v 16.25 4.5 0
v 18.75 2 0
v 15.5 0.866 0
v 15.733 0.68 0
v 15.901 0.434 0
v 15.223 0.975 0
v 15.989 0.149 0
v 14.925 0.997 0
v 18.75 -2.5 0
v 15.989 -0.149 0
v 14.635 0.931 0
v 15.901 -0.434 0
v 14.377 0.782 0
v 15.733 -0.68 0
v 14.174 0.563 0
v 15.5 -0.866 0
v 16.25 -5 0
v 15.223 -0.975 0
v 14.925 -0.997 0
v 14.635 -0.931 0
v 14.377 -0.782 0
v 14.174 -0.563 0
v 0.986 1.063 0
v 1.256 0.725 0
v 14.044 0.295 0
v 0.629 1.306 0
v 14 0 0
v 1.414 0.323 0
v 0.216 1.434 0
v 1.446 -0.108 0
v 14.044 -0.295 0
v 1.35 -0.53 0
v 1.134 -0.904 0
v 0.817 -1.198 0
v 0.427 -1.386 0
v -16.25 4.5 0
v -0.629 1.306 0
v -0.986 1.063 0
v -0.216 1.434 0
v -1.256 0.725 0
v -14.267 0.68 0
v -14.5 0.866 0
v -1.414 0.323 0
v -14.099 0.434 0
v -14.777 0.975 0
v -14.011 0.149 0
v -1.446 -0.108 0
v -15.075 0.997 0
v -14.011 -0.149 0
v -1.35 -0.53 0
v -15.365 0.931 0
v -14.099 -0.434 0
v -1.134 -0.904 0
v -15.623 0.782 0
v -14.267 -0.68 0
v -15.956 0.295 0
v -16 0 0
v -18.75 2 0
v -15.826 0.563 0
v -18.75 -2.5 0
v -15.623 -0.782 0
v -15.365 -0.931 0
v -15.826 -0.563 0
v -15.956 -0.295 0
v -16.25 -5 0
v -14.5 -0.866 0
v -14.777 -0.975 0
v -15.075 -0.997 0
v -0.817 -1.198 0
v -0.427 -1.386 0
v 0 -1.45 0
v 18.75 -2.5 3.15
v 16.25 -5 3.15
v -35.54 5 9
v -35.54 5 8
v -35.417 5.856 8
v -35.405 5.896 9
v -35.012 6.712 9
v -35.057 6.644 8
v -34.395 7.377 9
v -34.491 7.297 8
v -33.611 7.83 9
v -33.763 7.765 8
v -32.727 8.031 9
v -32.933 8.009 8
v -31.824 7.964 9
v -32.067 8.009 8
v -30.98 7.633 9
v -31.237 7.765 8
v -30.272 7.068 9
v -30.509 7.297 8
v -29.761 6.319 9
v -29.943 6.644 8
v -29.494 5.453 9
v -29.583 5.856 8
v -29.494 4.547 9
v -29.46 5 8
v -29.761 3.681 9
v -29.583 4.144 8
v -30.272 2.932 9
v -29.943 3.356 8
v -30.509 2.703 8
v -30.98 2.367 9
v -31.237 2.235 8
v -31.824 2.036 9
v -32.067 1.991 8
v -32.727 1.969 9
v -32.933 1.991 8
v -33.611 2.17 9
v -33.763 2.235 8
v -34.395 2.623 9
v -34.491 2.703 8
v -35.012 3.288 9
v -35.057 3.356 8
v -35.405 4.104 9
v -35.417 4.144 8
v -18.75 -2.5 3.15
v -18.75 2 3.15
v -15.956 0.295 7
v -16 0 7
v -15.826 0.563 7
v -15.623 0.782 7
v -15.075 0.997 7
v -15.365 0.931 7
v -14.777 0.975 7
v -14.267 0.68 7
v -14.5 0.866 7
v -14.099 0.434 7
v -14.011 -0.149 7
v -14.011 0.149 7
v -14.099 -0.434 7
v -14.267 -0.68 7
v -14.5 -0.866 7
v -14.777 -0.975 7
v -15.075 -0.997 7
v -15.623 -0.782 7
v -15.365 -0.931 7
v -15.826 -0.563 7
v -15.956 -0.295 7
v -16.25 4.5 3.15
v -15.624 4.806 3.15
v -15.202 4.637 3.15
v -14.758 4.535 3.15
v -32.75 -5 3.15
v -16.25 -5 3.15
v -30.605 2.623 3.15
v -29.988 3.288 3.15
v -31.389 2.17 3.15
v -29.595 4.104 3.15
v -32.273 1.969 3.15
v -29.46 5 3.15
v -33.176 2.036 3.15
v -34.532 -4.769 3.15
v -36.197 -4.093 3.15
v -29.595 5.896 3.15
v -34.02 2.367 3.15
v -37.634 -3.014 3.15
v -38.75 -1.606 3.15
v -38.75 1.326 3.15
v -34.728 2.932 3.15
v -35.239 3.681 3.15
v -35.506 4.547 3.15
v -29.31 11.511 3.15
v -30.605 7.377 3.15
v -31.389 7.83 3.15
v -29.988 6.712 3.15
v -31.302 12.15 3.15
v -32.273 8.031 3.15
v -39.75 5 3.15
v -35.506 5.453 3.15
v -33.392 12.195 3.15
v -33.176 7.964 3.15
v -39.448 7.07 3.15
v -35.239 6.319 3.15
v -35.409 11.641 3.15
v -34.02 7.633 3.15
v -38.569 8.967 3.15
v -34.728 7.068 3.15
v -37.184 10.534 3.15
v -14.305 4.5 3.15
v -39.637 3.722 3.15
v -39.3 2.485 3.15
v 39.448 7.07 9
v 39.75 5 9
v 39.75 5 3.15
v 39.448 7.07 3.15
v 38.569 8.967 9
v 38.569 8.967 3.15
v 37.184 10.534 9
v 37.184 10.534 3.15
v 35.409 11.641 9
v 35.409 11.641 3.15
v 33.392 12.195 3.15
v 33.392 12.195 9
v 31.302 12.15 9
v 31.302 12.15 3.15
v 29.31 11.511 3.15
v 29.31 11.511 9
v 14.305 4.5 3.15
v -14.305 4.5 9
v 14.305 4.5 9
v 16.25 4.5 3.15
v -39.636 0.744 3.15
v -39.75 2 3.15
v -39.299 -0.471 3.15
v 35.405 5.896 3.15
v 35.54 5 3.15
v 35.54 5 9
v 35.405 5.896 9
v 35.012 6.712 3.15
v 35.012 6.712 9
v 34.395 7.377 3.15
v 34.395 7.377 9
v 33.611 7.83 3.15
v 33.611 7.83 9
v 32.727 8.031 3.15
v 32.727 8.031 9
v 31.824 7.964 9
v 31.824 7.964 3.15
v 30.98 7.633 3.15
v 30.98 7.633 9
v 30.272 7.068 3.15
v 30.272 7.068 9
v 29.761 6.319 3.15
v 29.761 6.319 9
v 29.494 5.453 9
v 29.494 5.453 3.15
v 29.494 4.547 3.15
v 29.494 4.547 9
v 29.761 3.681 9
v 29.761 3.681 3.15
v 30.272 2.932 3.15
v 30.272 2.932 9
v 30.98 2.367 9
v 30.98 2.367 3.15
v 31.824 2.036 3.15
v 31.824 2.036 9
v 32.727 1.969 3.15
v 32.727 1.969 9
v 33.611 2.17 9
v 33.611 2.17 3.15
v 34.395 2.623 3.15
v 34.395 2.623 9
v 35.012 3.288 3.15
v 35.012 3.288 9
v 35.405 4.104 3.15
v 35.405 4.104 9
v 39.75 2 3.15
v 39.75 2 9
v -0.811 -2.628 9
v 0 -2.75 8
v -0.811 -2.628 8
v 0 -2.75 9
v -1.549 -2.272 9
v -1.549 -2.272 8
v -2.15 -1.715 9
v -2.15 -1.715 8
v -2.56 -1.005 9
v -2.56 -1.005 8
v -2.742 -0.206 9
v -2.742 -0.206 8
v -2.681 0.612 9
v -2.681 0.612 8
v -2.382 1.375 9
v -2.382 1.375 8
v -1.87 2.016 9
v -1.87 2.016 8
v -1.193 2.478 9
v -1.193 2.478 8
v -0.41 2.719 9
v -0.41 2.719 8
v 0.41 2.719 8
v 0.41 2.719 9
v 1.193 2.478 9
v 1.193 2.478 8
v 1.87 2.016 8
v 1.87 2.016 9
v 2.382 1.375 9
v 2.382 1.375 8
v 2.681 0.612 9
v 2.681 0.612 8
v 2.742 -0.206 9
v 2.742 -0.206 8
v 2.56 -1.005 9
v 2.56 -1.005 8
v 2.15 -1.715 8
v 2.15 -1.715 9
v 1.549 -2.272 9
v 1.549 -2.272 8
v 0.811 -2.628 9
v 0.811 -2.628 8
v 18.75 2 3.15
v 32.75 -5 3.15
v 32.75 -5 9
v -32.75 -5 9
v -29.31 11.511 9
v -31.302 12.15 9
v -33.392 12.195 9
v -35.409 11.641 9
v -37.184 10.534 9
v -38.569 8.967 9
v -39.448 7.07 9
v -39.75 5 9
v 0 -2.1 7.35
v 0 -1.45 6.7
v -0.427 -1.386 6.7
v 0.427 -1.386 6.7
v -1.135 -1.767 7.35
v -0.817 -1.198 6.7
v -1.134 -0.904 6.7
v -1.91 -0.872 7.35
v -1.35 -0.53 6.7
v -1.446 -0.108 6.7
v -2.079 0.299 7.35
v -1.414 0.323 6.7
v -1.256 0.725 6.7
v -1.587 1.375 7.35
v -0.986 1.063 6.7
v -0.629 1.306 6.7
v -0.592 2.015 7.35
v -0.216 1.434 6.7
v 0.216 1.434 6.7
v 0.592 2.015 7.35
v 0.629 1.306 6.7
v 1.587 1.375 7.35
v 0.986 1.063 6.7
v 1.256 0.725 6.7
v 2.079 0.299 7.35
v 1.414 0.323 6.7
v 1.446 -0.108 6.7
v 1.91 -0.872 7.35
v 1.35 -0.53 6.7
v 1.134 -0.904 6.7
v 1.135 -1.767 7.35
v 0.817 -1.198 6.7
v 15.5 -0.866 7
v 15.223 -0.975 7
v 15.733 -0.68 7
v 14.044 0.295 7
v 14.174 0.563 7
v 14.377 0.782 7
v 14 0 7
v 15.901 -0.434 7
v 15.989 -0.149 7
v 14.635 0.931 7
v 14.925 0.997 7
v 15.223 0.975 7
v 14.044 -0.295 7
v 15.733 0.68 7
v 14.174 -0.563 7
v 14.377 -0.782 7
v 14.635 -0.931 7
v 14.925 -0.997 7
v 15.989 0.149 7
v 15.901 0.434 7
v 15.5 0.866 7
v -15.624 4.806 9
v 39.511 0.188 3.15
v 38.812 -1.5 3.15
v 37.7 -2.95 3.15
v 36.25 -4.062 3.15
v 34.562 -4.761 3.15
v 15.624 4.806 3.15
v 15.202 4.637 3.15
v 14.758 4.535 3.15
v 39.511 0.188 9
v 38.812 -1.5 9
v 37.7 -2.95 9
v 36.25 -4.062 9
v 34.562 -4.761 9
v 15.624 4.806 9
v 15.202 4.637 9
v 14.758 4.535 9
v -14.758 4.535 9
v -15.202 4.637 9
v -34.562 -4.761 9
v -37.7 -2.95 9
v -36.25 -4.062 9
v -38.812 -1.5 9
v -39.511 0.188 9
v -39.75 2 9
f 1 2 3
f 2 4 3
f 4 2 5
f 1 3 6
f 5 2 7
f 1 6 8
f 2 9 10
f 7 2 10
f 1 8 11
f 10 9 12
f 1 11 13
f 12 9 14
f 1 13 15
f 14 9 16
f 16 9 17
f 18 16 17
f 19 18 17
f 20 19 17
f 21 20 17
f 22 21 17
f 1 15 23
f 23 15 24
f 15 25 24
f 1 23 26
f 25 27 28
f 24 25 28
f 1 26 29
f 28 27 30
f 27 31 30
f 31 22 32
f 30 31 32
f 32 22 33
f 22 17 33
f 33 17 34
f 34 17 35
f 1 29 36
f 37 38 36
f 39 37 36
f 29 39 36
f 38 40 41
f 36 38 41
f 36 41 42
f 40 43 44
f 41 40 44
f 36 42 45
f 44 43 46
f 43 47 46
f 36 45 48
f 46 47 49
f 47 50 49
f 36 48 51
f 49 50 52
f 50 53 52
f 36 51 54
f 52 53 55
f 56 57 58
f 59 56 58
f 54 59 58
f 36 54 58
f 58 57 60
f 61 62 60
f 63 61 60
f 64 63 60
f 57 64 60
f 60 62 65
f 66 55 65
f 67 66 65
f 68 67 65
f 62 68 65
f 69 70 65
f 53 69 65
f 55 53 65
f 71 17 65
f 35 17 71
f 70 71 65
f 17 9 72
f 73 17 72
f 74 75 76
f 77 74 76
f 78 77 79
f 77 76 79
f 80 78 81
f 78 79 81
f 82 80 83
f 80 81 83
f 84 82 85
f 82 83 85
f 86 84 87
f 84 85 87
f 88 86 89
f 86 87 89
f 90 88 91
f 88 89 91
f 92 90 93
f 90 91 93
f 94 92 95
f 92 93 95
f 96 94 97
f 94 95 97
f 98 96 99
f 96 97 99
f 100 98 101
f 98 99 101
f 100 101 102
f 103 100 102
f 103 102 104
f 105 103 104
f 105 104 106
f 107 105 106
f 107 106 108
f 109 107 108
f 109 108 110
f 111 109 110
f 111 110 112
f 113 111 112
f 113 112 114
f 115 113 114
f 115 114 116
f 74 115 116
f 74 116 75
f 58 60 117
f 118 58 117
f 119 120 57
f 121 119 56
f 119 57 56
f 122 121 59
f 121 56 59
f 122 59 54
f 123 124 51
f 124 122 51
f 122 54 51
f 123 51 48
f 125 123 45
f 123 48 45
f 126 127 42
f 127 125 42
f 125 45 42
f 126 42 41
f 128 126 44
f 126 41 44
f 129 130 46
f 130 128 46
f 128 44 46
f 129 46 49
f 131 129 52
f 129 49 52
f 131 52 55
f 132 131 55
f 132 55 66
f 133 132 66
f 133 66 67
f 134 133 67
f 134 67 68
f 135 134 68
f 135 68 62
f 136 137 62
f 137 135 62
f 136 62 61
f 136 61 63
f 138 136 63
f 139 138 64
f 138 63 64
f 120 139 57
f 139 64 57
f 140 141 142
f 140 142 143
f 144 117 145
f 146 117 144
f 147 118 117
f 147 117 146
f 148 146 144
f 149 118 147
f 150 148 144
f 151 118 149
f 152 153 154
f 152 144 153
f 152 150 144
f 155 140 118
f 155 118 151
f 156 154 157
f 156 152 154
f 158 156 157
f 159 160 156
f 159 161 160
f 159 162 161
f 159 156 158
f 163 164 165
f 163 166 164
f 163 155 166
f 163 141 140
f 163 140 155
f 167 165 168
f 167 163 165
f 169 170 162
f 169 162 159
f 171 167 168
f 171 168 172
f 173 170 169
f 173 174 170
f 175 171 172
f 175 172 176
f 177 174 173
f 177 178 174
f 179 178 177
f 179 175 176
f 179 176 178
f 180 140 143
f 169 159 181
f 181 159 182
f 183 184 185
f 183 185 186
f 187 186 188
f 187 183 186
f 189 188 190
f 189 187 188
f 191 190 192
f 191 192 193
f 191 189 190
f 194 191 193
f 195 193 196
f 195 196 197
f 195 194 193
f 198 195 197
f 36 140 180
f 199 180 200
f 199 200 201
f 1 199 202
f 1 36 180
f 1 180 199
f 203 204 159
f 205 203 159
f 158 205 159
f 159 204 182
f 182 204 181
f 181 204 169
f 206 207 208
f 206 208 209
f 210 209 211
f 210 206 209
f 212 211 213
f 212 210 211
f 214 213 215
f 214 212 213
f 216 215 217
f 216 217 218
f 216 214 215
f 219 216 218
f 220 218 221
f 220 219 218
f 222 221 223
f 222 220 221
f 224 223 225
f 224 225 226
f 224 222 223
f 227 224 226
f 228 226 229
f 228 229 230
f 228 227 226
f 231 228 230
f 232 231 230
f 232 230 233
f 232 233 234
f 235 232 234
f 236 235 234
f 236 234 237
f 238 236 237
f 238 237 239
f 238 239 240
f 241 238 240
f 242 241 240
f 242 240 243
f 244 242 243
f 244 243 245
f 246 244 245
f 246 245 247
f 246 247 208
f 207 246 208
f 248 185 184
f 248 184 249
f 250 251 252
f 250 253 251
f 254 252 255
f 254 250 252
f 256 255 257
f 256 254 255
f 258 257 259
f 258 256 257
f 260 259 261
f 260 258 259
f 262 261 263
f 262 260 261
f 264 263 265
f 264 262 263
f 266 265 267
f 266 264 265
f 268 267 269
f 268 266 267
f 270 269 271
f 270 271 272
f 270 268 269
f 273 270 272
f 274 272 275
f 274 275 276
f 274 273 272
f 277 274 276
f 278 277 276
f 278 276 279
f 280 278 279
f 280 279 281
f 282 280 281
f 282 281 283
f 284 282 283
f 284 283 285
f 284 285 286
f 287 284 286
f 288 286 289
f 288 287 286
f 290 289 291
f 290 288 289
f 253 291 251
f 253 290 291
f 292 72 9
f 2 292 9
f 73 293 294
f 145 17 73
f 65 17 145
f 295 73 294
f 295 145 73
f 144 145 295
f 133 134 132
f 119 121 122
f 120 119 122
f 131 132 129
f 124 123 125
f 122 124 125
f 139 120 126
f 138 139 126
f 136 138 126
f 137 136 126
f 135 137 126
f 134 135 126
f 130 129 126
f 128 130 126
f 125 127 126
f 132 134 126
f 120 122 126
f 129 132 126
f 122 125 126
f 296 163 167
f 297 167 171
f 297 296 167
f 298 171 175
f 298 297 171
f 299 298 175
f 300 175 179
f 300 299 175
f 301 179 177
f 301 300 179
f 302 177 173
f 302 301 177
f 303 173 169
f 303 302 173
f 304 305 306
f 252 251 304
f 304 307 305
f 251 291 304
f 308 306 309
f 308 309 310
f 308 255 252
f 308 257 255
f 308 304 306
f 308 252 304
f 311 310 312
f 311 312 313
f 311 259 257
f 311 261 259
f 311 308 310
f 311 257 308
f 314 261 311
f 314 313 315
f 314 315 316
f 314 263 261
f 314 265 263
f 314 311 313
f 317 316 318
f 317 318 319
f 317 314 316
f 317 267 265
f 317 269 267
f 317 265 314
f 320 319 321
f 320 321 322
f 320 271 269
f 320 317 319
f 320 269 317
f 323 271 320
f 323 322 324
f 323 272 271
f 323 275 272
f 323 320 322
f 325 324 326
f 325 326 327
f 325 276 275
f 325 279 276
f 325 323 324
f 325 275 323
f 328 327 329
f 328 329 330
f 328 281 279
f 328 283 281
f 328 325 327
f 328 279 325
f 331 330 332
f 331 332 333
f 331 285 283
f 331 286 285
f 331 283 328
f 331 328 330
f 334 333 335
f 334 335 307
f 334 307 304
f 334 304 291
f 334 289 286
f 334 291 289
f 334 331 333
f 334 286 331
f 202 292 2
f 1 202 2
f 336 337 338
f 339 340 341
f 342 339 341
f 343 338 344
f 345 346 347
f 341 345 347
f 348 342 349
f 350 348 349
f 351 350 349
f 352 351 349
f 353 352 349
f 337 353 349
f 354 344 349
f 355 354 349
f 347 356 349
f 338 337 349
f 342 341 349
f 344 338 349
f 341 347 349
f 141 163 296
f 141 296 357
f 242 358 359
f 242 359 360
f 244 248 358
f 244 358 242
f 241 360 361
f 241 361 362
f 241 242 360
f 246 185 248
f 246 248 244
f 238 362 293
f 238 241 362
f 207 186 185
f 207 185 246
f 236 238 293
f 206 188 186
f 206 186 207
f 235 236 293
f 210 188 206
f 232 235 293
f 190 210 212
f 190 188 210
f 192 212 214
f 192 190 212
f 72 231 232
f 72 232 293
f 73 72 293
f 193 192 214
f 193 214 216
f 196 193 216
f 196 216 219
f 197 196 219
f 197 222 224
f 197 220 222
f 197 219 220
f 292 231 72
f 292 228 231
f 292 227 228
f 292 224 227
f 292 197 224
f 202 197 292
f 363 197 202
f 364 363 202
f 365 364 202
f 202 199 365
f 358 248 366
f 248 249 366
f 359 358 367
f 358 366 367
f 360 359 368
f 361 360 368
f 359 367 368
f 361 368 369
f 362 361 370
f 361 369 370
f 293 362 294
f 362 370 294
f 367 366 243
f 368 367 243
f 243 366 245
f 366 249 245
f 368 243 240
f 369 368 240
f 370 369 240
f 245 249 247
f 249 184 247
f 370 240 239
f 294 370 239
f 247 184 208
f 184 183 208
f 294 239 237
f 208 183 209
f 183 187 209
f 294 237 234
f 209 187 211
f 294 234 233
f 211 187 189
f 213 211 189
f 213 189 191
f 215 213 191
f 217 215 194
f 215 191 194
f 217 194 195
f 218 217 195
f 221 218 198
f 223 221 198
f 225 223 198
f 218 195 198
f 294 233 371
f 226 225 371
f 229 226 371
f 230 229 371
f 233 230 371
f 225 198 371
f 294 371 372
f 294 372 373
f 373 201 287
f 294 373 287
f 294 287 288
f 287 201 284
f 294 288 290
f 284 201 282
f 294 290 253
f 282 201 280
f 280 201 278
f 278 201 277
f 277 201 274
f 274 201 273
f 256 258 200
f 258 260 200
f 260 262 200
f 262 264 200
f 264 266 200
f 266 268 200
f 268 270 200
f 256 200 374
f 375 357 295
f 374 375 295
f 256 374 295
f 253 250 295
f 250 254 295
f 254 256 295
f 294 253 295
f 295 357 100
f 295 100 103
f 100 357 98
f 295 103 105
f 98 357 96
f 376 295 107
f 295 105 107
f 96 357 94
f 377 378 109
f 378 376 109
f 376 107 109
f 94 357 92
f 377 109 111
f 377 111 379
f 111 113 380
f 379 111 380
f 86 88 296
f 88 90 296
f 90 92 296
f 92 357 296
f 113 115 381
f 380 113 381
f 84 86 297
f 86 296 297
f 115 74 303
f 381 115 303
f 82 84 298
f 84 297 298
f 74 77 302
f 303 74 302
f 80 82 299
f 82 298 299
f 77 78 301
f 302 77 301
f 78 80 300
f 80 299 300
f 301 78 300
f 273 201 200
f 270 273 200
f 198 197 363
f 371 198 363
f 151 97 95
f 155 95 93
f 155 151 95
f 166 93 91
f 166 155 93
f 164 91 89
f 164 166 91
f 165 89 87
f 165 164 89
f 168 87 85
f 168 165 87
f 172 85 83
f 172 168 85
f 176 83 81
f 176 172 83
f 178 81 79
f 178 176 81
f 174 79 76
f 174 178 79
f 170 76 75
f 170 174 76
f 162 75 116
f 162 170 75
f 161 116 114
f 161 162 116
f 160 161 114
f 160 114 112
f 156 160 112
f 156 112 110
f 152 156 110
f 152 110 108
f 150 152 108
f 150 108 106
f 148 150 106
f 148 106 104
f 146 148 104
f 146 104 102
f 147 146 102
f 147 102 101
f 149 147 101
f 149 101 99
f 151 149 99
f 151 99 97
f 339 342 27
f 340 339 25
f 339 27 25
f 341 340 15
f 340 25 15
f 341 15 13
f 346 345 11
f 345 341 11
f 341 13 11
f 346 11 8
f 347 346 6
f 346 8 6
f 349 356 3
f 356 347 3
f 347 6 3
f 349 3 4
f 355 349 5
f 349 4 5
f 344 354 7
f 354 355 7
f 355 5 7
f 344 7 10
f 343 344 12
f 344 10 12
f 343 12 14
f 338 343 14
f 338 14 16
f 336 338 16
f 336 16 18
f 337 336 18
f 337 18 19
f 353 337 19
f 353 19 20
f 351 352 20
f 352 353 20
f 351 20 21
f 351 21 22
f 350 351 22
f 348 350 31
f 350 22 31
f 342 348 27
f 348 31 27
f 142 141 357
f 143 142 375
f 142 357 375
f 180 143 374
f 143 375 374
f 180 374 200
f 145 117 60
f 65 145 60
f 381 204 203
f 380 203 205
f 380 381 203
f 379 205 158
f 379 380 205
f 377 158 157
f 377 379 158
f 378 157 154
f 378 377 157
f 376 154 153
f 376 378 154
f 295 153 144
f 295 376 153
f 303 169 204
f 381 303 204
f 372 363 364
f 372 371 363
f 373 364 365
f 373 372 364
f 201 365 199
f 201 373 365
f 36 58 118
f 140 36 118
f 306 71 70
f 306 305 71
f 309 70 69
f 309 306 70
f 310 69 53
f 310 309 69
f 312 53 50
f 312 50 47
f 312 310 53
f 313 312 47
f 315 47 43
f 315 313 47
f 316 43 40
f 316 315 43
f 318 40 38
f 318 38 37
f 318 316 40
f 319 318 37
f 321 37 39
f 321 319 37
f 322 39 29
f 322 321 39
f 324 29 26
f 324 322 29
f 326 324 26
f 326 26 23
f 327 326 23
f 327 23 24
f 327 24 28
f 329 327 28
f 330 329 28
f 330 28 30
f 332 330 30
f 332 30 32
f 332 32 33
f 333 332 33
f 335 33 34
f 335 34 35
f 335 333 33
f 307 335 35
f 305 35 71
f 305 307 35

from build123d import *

# Parameters (mm, degrees)
SKETCH1_W                    = 77.5
SKETCH1_H                    = 7
BOSS_EXTRUDE1_DEPTH          = 9
BOSS_EXTRUDE1_DEPTH_BACK     = 9
SKETCH2_W                    = 20
SKETCH2_H                    = 6.3
CUT_EXTRUDE1_DEPTH           = 8
SKETCH3_W                    = 12.5
SKETCH3_H                    = 5.85
BOSS_EXTRUDE2_DEPTH          = 8
SKETCH4_R                    = 3.04
CUT_EXTRUDE2_DEPTH           = 22
CUT_EXTRUDE2_DEPTH_BACK      = 24.5
CUT_EXTRUDE3_DEPTH           = 5
SKETCH6_R                    = 6.2
CUT_EXTRUDE4_DEPTH           = 1
MIRROR2_COPY_1_SKETCH_R      = 6.2
MIRROR2_COPY_1_DEPTH         = 1
SKETCH7_W                    = 12.5
SKETCH7_H                    = 8.5
CUT_EXTRUDE5_DEPTH           = 1
MIRROR5_COPY_1_SKETCH_W      = 12.5
MIRROR5_COPY_1_SKETCH_H      = 8.5
MIRROR5_COPY_1_DEPTH         = 1
TAP_DRILL_FOR_M2_TAP1_D      = 1.6
CUT_EXTRUDE6_DEPTH           = 27
SKETCH12_W                   = 83.830839912
SKETCH12_H                   = 36.587504352
CUT_EXTRUDE7_DEPTH           = 22
F_2_0_2_DIAMETER_HOLE1_D     = 2
F_2_0_2_DIAMETER_HOLE1_DEPTH = 30.5
F_2_0_2_DIAMETER_HOLE2_D     = 2
F_2_0_2_DIAMETER_HOLE2_DEPTH = 16
F_2_0_2_DIAMETER_HOLE2_TIP   = 0.600860619
ESQUISSE2_R                  = 3.04
BOSS_EXTRU_1_DEPTH           = 1
ESQUISSE5_R                  = 0.8
BOSS_EXTRU_3_DEPTH           = 5.85
ESQUISSE6_R                  = 0.8
BOSS_EXTRU_4_DEPTH           = 9
BOSS_EXTRUDE3_DEPTH          = 1.5
BOSS_EXTRUDE4_DEPTH          = 1
SKETCH28_R                   = 7.25
SKETCH28_R_2                 = 6.25
BOSS_EXTRUDE7_DEPTH          = 5.85
BOSS_EXTRUDE5_DEPTH          = 5.85
FILLET2_R                    = 3
CHAMFER1_SIZE                = 2.5
SKETCH27_R                   = 1
BOSS_EXTRUDE6_DEPTH          = 2
BOSS_EXTRUDE8_DEPTH          = 5.85
FILLET3_R                    = 7


with BuildPart() as part:
    # Sketch1 → Boss-Extrude1 (new body, two sides)
    with BuildSketch(Plane.XY) as boss_extrude1_sk:
        Rectangle(SKETCH1_W, SKETCH1_H)
    extrude(amount=BOSS_EXTRUDE1_DEPTH)
    extrude(boss_extrude1_sk.sketch, amount=-BOSS_EXTRUDE1_DEPTH_BACK)

    # Sketch2 → Cut-Extrude1 (cut, through all)
    with BuildSketch(Plane(origin=(0, 3.5, 0), x_dir=(1, 0, 0), z_dir=(0, 1, 0))):
        with Locations((-28.75, 0)):
            Rectangle(SKETCH2_W, SKETCH2_H)
        with Locations((28.75, 0)):
            Rectangle(SKETCH2_W, SKETCH2_H)
    extrude(amount=-CUT_EXTRUDE1_DEPTH, mode=Mode.SUBTRACT)

    # Sketch3 → Boss-Extrude2 (add)
    with BuildSketch(Plane(origin=(0, 3.5, 0), x_dir=(1, 0, 0), z_dir=(0, 1, 0))):
        with Locations((-32.5, 6.075)):
            Rectangle(SKETCH3_W, SKETCH3_H)
        with Locations((-32.5, -6.075)):
            Rectangle(SKETCH3_W, SKETCH3_H)
        with Locations((32.5, -6.075)):
            Rectangle(SKETCH3_W, SKETCH3_H)
        with Locations((32.5, 6.075)):
            Rectangle(SKETCH3_W, SKETCH3_H)
    extrude(amount=BOSS_EXTRUDE2_DEPTH)

    # Sketch4 → Cut-Extrude2 (cut, two sides)
    with BuildSketch(Plane.XY) as cut_extrude2_sk:
        with Locations((-32.5, 5)):
            Circle(SKETCH4_R)
        with Locations((32.5, 5)):
            Circle(SKETCH4_R)
    extrude(amount=CUT_EXTRUDE2_DEPTH, mode=Mode.SUBTRACT)
    extrude(cut_extrude2_sk.sketch, amount=-CUT_EXTRUDE2_DEPTH_BACK, mode=Mode.SUBTRACT)

    # Sketch5 → Cut-Extrude3 (cut)
    with BuildSketch(Plane.XY):
        Polygon((15, 3.5), (36.256888292, -2.195766051), (36.256888292, 11.5), (15, 11.5), align=None)
    extrude(amount=-CUT_EXTRUDE3_DEPTH, mode=Mode.SUBTRACT)

    # Sketch6 → Cut-Extrude4 (cut)
    with BuildSketch(Plane.XY.offset(9)):
        with Locations((32.5, 5)):
            Circle(SKETCH6_R)
    cut_extrude4 = extrude(amount=-CUT_EXTRUDE4_DEPTH, mode=Mode.SUBTRACT)

    # Mirror1: Cut-Extrude4 across plane
    add(cut_extrude4.mirror(Plane.XY), mode=Mode.SUBTRACT)

    # Mirror2: Cut-Extrude4 across plane
    add(cut_extrude4.mirror(Plane(origin=(0, 0, 0), x_dir=(0, 0, 1), z_dir=(1, 0, 0))), mode=Mode.SUBTRACT)

    # Mirror2 copy 1 sketch → Mirror2 copy 1 (cut)
    with BuildSketch(Plane(origin=(0, 0, -9), x_dir=(-1, 0, 0), z_dir=(0, 0, -1))):
        with Locations((32.5, 5)):
            Circle(MIRROR2_COPY_1_SKETCH_R)
    extrude(amount=-MIRROR2_COPY_1_DEPTH, mode=Mode.SUBTRACT)

    # Sketch7 → Cut-Extrude5 (cut)
    with BuildSketch(Plane.XY.offset(9)):
        with Locations((-32.5, 7.25)):
            Rectangle(SKETCH7_W, SKETCH7_H)
    cut_extrude5 = extrude(amount=-CUT_EXTRUDE5_DEPTH, mode=Mode.SUBTRACT)

    # Mirror3: Cut-Extrude5 across plane
    add(cut_extrude5.mirror(Plane(origin=(0, 0, 0), x_dir=(0, 0, 1), z_dir=(1, 0, 0))), mode=Mode.SUBTRACT)

    # Mirror5: Cut-Extrude5 across plane
    add(cut_extrude5.mirror(Plane.XY), mode=Mode.SUBTRACT)

    # Mirror5 copy 1 sketch → Mirror5 copy 1 (cut)
    with BuildSketch(Plane(origin=(0, 0, -9), x_dir=(-1, 0, 0), z_dir=(0, 0, -1))):
        with Locations((-32.5, 7.25)):
            Rectangle(MIRROR5_COPY_1_SKETCH_W, MIRROR5_COPY_1_SKETCH_H)
    extrude(amount=-MIRROR5_COPY_1_DEPTH, mode=Mode.SUBTRACT)

    # Tap Drill for M2 Tap1 (through all)
    with Locations(Plane.XY.offset(9)):
        with Locations((-25, 0), (0, 0), (25, 0)):
            Hole(TAP_DRILL_FOR_M2_TAP1_D / 2)

    # Sketch11 → Cut-Extrude6 (cut)
    with BuildSketch(Plane.XY.offset(9)):
        with BuildLine():
            Line((-38.75, 4.999999534), (-38.75, 21.221242017))
            Line((-38.75, 21.221242017), (-26.25, 21.221242017))
            Line((-26.25, 21.221242017), (-26.25, 4.999999534))
            ThreePointArc((-26.25, 4.999999534), (-32.5, 11.25), (-38.75, 4.999999534))
        make_face()
    cut_extrude6 = extrude(amount=-CUT_EXTRUDE6_DEPTH, mode=Mode.SUBTRACT)

    # Mirror6: Cut-Extrude6 across plane
    add(cut_extrude6.mirror(Plane(origin=(0, 0, 0), x_dir=(0, 0, 1), z_dir=(1, 0, 0))), mode=Mode.SUBTRACT)

    # Sketch12 → Cut-Extrude7 (cut)
    with BuildSketch(Plane.XY):
        Rectangle(SKETCH12_W, SKETCH12_H)
    extrude(amount=-CUT_EXTRUDE7_DEPTH, mode=Mode.SUBTRACT)

    # 2.0 _2_ Diameter Hole1
    with Locations(Plane.XY.offset(9)):
        with Locations((-15, 0)):
            Hole(F_2_0_2_DIAMETER_HOLE1_D / 2, depth=F_2_0_2_DIAMETER_HOLE1_DEPTH)

    # 2.0 _2_ Diameter Hole2
    with Locations(Plane.XY.offset(9)):
        with Locations((15, 0)):
            Hole(F_2_0_2_DIAMETER_HOLE2_D / 2, depth=F_2_0_2_DIAMETER_HOLE2_DEPTH)
            with Locations((0, 0, -(F_2_0_2_DIAMETER_HOLE2_DEPTH + F_2_0_2_DIAMETER_HOLE2_TIP / 2))):  # 118° drill point
                Cone(0, F_2_0_2_DIAMETER_HOLE2_D / 2, F_2_0_2_DIAMETER_HOLE2_TIP, mode=Mode.SUBTRACT)

    # Esquisse2 → Boss.-Extru.1 (add)
    with BuildSketch(Plane.XY.offset(8)):
        with BuildLine():
            ThreePointArc((26.6314397, 3), (31.48636147, 11.116578858), (38.7, 5))
            ThreePointArc((38.7, 5), (38.616578858, 3.98636147), (38.3685603, 3))
            Line((38.3685603, 3), (38.75, 3))
            Line((38.75, 3), (38.75, 4.999999534))
            ThreePointArc((38.75, 4.999999534), (32.5, 11.25), (26.25, 4.999999534))
            Line((26.25, 4.999999534), (26.25, 3.5))
            Line((26.25, 3.5), (26.25, 3))
            Line((26.25, 3), (26.6314397, 3))
        make_face()
        with BuildLine():
            ThreePointArc((38.3685603, 3), (38.616578858, 3.98636147), (38.7, 5))
            ThreePointArc((38.7, 5), (31.48636147, 11.116578858), (26.6314397, 3))
            ThreePointArc((26.6314397, 3), (32.5, -1.2), (38.3685603, 3))
        make_face()
        with Locations((32.5, 5)):
            Circle(ESQUISSE2_R, mode=Mode.SUBTRACT)
    boss_extru_1 = extrude(amount=BOSS_EXTRU_1_DEPTH)

    # Sym_trie1: Boss.-Extru.1 across plane
    add(boss_extru_1.mirror(Plane(origin=(0, 0, 0), x_dir=(0, 0, 1), z_dir=(1, 0, 0))))

    # Esquisse5 → Boss.-Extru.3 (add)
    with BuildSketch(Plane.XY.offset(9)):
        with Locations((-25, 0)):
            Circle(ESQUISSE5_R)
        with Locations((25, 0)):
            Circle(ESQUISSE5_R)
    extrude(amount=-BOSS_EXTRU_3_DEPTH)

    # Esquisse6 → Boss.-Extru.4 (add)
    with BuildSketch(Plane.XY.offset(9)):
        Circle(ESQUISSE6_R)
    extrude(amount=-BOSS_EXTRU_4_DEPTH)

    # Sketch22 → Boss-Extrude3 (add)
    with BuildSketch(Plane.XZ.offset(3.5)):
        Polygon((-18.75, 0), (18.75, 0), (18.75, 3.15), (38.75, 3.15), (38.75, 9), (-38.75, 9), (-38.75, 3.15), (-18.75, 3.15), align=None)
    extrude(amount=BOSS_EXTRUDE3_DEPTH)

    # Sketch23 → CSK for M2.5 Countersunk Flat Head Screw (revolve, cut)
    with BuildSketch(Plane(origin=(0, 0, 9), x_dir=(0, -1, 0), z_dir=(1, 0, 0))):
        Polygon((0, 0), (0, 9), (1.45, 9), (1.45, 2.3), (2.75, 1), (2.75, 0), align=None)
    revolve(axis=Axis((0, 0, 15.35), (0, 0, -1)), mode=Mode.SUBTRACT)

    # Sketch25 → Boss-Extrude4 (add)
    with BuildSketch(Plane(origin=(0, 3.5, 0), x_dir=(1, 0, 0), z_dir=(0, 1, 0))):
        Polygon((18.75, 0), (-18.75, 0), (-18.75, -3.15), (-26.25, -3.15), (-26.25, -9), (26.25, -9), (26.25, -3.15), (18.75, -3.15), align=None)
    extrude(amount=BOSS_EXTRUDE4_DEPTH)

    # Sketch28 → Boss-Extrude7 (add)
    with BuildSketch(Plane.XY.offset(9)):
        with Locations((-32.5, 5)):
            Circle(SKETCH28_R)
        with Locations((-32.5, 5)):
            Circle(SKETCH28_R_2, mode=Mode.SUBTRACT)
        with Locations((32.5, 5)):
            Circle(SKETCH28_R)
        with Locations((32.5, 5)):
            Circle(SKETCH28_R_2, mode=Mode.SUBTRACT)
    extrude(amount=-BOSS_EXTRUDE7_DEPTH)

    # Sketch26 → Boss-Extrude5 (add)
    with BuildSketch(Plane(origin=(0, 0, 3.15), x_dir=(-1, 0, 0), z_dir=(0, 0, -1))):
        Polygon((-29.310409021, 11.510684249), (-15, 4.5), (-25.267261929, 4.5), align=None)
        Polygon((25.267261929, 4.5), (29.310409021, 11.510684249), (15, 4.5), align=None)
    extrude(amount=-BOSS_EXTRUDE5_DEPTH)

    # Fillet2
    fillet2_edges = [part.edges().sort_by_distance(p)[0] for p in [
        (15, 4.5, 6.075),
        (-15, 4.5, 6.075),
    ]]
    fillet(fillet2_edges, radius=FILLET2_R)

    # Chamfer1
    chamfer1_edges = [part.edges().sort_by_distance(p)[0] for p in [
        (-18.75, -5, 1.575),
        (18.75, -5, 1.575),
        (18.75, 4.5, 1.575),
        (-18.75, 4.5, 1.575),
    ]]
    chamfer(chamfer1_edges, length=CHAMFER1_SIZE)

    # Sketch27 → Boss-Extrude6 (add)
    with BuildSketch(Plane.XY.offset(9)):
        with Locations((-15, 0)):
            Circle(SKETCH27_R)
        with Locations((15, 0)):
            Circle(SKETCH27_R)
    extrude(amount=-BOSS_EXTRUDE6_DEPTH)

    # Sketch29 → Boss-Extrude8 (add)
    with BuildSketch(Plane(origin=(0, 0, 3.15), x_dir=(-1, 0, 0), z_dir=(0, 0, -1))):
        Polygon((-39.75, 5), (-39.75, -5), (-38.75, -5), (-38.75, 1.325765386), align=None)
        Polygon((38.75, 1.325765386), (39.75, 5), (39.75, -5), (38.75, -5), align=None)
    extrude(amount=-BOSS_EXTRUDE8_DEPTH)

    # Fillet3
    fillet3_edges = [part.edges().sort_by_distance(p)[0] for p in [
        (39.75, -5, 6.075),
        (-39.75, -5, 6.075),
    ]]
    fillet(fillet3_edges, radius=FILLET3_R)


solid = part.part
